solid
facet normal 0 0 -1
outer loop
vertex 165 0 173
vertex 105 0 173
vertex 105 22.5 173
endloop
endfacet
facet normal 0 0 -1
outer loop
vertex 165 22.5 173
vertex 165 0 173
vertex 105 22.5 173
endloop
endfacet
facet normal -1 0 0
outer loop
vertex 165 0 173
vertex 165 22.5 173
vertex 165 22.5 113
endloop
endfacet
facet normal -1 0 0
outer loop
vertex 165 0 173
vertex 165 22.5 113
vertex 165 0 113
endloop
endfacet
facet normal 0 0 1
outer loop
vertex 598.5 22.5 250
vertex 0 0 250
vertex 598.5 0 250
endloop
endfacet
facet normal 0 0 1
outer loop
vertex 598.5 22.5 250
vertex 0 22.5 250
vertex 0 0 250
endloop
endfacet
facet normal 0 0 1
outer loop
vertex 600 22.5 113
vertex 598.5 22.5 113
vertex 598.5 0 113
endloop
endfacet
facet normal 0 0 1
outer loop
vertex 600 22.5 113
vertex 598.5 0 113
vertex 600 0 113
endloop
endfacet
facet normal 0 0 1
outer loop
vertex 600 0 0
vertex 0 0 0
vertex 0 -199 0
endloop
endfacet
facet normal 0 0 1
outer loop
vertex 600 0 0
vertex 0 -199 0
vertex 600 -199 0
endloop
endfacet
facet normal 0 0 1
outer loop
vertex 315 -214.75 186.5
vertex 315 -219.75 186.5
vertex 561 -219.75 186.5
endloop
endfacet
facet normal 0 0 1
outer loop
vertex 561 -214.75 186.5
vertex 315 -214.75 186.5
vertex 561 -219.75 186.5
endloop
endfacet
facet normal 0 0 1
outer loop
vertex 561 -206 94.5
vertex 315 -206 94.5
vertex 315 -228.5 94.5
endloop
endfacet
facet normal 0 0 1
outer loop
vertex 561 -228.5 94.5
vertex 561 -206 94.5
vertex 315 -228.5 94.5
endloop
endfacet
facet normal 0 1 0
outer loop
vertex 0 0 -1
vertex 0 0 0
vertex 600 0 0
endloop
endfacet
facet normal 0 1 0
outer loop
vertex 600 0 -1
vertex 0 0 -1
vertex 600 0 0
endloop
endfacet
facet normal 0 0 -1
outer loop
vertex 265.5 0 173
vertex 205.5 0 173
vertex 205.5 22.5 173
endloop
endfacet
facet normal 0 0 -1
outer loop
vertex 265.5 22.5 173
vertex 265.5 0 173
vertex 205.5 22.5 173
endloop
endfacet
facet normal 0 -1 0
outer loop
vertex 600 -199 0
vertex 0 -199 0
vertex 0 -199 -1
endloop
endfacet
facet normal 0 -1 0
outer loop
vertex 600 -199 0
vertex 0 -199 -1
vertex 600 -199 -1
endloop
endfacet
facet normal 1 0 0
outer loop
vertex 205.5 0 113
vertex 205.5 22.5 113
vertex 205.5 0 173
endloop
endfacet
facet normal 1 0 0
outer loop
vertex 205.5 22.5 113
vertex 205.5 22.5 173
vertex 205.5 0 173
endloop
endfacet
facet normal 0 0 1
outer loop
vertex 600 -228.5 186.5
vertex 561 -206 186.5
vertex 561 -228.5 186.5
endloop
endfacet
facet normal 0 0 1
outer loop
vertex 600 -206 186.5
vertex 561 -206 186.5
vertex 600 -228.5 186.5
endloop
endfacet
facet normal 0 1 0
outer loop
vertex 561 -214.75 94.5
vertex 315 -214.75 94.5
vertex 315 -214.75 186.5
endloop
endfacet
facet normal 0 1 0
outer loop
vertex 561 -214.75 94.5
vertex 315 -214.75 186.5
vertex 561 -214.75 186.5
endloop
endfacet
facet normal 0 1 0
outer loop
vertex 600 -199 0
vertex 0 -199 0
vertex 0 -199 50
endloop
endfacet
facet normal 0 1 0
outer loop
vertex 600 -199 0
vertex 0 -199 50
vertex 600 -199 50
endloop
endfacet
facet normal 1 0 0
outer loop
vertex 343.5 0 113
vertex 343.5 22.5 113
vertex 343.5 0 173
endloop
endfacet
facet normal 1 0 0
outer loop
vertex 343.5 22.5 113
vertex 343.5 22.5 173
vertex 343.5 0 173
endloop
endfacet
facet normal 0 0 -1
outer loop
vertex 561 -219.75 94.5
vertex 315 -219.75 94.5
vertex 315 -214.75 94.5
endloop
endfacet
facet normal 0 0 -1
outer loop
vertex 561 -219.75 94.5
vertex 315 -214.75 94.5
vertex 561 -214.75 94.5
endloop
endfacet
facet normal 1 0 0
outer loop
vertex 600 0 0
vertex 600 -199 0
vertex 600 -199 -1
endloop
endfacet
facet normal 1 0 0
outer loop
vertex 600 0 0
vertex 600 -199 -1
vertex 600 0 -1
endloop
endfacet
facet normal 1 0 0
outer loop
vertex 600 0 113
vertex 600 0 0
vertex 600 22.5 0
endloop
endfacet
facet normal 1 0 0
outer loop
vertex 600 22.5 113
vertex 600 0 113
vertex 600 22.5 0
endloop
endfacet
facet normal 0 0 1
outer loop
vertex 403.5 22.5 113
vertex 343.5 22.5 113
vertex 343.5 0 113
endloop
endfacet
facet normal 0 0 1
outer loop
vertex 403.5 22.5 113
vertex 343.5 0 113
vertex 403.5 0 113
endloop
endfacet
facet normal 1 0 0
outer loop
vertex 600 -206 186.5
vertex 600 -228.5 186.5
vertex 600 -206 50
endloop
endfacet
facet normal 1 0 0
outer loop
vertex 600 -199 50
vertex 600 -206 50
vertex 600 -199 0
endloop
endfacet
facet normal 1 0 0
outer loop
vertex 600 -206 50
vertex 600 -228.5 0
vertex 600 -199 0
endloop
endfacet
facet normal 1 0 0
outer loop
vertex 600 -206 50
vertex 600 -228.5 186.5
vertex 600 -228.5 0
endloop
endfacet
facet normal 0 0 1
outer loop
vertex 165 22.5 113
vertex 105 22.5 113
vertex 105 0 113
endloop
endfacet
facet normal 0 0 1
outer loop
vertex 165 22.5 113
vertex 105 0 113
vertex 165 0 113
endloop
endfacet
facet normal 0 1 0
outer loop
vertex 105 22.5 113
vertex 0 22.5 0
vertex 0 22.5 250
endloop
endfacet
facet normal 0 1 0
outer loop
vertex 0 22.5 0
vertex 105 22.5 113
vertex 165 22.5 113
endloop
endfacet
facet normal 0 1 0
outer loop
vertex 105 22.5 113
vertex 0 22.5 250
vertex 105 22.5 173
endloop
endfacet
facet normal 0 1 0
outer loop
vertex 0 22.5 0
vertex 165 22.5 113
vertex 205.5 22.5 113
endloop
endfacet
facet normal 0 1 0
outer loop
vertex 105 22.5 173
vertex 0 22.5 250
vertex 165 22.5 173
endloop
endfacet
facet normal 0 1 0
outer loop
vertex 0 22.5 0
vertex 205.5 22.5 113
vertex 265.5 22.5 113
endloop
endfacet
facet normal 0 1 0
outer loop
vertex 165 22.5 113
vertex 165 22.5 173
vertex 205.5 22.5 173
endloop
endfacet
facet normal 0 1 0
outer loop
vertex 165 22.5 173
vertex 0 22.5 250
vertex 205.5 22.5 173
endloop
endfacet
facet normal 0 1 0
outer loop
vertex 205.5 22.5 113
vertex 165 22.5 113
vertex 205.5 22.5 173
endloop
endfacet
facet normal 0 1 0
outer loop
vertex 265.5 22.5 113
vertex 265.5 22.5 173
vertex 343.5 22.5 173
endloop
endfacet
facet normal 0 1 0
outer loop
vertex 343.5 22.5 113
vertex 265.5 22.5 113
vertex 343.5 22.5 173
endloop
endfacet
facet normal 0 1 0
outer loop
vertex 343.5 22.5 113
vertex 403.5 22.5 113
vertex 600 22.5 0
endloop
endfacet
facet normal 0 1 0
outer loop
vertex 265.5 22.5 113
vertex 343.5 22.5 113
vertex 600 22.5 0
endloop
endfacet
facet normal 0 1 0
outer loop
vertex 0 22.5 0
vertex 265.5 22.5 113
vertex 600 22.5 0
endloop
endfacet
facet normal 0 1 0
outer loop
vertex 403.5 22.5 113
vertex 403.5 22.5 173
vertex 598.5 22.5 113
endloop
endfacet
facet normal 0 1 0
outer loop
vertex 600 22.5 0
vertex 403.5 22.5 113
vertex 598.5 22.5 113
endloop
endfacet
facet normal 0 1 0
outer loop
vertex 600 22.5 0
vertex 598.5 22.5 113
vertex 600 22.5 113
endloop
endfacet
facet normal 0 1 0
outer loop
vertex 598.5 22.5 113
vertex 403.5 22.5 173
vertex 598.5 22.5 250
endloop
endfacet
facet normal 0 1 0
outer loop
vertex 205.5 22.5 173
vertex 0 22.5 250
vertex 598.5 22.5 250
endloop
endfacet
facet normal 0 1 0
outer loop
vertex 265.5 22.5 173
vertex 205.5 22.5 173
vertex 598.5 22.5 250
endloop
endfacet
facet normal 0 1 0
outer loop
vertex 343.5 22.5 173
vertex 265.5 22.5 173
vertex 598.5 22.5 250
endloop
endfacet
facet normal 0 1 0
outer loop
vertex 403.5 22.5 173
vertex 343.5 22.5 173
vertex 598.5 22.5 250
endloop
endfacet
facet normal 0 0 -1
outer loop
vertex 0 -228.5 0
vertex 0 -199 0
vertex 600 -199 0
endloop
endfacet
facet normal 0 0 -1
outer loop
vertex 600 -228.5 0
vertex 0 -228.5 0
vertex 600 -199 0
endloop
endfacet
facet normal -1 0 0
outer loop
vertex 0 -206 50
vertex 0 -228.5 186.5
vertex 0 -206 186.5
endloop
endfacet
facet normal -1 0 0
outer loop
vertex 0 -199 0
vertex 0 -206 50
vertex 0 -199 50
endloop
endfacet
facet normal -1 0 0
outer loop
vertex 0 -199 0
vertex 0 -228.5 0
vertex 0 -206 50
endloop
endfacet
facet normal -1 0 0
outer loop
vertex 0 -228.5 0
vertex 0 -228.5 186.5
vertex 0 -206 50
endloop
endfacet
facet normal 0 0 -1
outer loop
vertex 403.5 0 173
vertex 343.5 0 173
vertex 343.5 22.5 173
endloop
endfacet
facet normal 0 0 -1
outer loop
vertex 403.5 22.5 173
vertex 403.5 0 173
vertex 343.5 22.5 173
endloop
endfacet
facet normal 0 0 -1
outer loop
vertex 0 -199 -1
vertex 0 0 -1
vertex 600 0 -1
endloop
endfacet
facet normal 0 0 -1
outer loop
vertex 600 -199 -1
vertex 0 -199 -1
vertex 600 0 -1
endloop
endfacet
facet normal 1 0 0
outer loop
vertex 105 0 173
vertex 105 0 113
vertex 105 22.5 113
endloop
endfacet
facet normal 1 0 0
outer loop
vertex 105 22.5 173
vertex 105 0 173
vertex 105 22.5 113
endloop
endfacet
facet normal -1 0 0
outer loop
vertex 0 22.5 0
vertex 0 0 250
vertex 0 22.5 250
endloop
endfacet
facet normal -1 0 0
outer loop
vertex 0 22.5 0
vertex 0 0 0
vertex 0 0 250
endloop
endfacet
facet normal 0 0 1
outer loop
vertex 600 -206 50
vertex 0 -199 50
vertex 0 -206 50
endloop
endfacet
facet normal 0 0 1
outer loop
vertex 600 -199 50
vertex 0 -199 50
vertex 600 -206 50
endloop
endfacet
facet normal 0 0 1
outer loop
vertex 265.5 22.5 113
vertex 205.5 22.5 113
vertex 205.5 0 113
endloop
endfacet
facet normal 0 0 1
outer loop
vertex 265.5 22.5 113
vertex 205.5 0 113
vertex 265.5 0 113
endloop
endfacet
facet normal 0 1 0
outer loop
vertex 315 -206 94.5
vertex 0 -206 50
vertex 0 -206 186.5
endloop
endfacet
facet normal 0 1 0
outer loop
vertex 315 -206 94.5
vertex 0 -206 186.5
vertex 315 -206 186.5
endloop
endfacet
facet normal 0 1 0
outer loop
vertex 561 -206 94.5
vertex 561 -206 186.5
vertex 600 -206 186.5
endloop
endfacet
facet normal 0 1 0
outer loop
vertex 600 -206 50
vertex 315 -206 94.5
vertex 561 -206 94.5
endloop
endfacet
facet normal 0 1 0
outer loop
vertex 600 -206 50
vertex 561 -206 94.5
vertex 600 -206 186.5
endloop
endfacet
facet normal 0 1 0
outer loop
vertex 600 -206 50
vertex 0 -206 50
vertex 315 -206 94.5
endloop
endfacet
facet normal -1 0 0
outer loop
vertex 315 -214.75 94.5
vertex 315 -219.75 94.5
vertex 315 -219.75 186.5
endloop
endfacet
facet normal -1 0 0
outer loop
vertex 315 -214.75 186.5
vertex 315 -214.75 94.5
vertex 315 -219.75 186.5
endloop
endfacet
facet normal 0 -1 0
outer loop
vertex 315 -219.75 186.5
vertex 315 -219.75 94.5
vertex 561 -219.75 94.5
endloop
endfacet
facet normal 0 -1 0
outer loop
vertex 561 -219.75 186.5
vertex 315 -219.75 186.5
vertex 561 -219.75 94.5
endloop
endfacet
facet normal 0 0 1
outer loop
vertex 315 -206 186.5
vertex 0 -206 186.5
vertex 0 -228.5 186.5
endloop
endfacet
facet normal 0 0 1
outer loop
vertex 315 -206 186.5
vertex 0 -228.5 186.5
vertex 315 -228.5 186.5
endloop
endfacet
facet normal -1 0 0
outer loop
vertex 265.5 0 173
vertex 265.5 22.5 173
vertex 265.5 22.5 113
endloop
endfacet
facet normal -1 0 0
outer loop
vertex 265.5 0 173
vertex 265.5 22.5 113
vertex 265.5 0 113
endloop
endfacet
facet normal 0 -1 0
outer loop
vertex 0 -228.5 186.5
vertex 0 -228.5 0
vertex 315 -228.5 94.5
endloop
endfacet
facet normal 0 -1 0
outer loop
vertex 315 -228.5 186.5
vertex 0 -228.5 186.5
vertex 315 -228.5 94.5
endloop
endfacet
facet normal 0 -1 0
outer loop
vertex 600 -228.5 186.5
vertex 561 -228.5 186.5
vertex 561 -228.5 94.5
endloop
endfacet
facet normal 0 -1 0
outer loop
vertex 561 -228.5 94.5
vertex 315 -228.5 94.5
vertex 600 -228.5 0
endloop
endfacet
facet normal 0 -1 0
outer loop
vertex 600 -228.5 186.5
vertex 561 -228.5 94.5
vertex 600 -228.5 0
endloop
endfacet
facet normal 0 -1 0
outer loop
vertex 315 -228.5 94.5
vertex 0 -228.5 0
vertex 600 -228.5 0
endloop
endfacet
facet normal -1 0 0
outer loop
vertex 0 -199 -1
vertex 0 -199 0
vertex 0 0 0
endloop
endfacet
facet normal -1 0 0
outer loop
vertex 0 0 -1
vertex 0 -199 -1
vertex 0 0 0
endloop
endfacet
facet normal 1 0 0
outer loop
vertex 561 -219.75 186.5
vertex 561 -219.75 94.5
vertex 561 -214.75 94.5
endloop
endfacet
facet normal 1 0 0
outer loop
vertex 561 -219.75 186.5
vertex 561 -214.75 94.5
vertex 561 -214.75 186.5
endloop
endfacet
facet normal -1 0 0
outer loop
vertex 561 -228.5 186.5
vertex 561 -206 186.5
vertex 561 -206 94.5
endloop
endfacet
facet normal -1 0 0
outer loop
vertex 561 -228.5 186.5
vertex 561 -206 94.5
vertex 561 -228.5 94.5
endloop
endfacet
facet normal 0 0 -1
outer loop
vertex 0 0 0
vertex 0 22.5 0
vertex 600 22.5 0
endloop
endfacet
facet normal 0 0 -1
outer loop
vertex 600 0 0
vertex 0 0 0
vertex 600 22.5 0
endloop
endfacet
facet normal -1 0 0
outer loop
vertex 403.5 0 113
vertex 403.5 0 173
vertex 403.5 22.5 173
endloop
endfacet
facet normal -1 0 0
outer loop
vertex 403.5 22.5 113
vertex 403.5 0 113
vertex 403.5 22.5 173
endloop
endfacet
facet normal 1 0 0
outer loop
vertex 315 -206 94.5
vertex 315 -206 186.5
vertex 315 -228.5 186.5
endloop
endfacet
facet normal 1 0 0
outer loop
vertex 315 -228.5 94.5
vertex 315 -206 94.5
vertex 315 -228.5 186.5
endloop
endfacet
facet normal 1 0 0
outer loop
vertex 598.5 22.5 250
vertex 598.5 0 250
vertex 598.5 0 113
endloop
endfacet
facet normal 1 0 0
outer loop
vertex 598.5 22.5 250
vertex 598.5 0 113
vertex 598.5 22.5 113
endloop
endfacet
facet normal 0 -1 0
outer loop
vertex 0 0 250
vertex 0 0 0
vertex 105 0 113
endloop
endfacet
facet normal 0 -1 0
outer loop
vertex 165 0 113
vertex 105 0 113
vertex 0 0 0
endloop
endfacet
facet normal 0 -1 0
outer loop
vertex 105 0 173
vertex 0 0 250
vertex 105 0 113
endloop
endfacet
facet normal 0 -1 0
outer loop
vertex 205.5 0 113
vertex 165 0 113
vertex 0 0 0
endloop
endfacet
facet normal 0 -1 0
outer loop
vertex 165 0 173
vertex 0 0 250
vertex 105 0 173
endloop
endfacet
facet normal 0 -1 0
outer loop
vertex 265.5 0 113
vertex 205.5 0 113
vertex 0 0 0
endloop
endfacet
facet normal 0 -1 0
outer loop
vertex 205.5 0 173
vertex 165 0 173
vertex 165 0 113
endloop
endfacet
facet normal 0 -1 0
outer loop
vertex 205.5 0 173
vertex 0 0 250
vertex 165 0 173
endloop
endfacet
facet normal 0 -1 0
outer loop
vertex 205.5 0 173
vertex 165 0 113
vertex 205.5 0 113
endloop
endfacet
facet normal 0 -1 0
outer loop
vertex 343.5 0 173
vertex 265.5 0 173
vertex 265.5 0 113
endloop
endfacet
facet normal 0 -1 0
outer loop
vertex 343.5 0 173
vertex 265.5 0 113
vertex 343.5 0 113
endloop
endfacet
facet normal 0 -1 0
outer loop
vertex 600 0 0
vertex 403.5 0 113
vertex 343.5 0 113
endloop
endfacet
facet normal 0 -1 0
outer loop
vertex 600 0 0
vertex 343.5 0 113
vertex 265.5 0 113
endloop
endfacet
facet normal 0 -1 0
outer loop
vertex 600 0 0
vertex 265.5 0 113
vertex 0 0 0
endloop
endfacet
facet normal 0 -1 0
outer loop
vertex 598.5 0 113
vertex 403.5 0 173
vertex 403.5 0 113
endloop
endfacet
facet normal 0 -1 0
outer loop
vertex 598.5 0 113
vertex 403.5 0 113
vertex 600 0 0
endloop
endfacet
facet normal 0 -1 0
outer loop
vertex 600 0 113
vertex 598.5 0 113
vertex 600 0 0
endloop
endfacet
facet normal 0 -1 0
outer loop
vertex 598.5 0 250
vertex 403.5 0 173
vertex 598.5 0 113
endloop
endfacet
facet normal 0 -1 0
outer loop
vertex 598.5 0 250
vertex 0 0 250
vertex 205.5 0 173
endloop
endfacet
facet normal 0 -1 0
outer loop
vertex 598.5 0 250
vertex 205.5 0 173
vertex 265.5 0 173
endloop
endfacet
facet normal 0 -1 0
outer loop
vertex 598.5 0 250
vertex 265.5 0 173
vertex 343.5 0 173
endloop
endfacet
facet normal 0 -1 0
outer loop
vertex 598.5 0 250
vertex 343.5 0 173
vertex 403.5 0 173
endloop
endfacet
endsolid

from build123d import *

# Parameters (mm, degrees)
F1_W      = 600
F1_H      = 22.5
F2_DEPTH  = 113
F3_W      = 105
F3_H      = 22.5
F4_DEPTH  = 137
F5_W      = 22.5
F5_H      = 77
F6_DEPTH  = 100.5
F7_W      = 40.5
F7_H      = 22.5
F8_DEPTH  = 61
F9_W      = 22.5
F9_H      = 77
F10_DEPTH = 138
F11_W     = 78
F11_H     = 22.5
F12_DEPTH = 61
F13_W     = 22.5
F13_H     = 77
F14_DEPTH = 60
F15_W     = 195
F15_H     = 22.5
F16_DEPTH = 140
F0_W      = 600
F0_H      = 199
F17_DEPTH = 1
F18_W     = 600
F18_H     = 29.5
F19_DEPTH = 50
F20_W     = 600
F20_H     = 22.5
F21_DEPTH = 136.5
F23_START = -315
F22_W     = 22.5
F22_H     = 92
F23_DEPTH = 246
F24_W     = 246
F24_H     = 5
F25_DEPTH = 92
F26_DEPTH = 8.75
F27_DEPTH = 8.75


with BuildPart() as f2:
    # F1 (on face) → F2 (new body)
    with BuildSketch(Plane.XY):
        with Locations((300, 11.25)):
            Rectangle(F1_W, F1_H)
    extrude(amount=F2_DEPTH)

    # F3 (on face) → F4 (join)
    with BuildSketch(Plane.XY.offset(113)):
        with Locations((52.5, 11.25)):
            Rectangle(F3_W, F3_H)
    extrude(amount=F4_DEPTH)

    # F5 (on face) → F6 (join)
    with BuildSketch(Plane.YZ.offset(105)):
        with Locations((11.25, 211.5)):
            Rectangle(F5_W, F5_H)
    extrude(amount=F6_DEPTH)

    # F7 (on face) → F8 (join)
    with BuildSketch(Plane(origin=(0, 0, 173), x_dir=(1, 0, 0), z_dir=(0, 0, -1))):
        with Locations((185.25, -11.25)):
            Rectangle(F7_W, F7_H)
    extrude(amount=F8_DEPTH)

    # F9 (on face) → F10 (join)
    with BuildSketch(Plane.YZ.offset(205.5)):
        with Locations((11.25, 211.5)):
            Rectangle(F9_W, F9_H)
    extrude(amount=F10_DEPTH)

    # F11 (on face) → F12 (join)
    with BuildSketch(Plane(origin=(0, 0, 173), x_dir=(1, 0, 0), z_dir=(0, 0, -1))):
        with Locations((304.5, -11.25)):
            Rectangle(F11_W, F11_H)
    extrude(amount=F12_DEPTH)

    # F13 (on face) → F14 (join)
    with BuildSketch(Plane.YZ.offset(343.5)):
        with Locations((11.25, 211.5)):
            Rectangle(F13_W, F13_H)
    extrude(amount=F14_DEPTH)

    # F15 (on face) → F16 (join)
    with BuildSketch(Plane.XY.offset(250)):
        with Locations((501, 11.25)):
            Rectangle(F15_W, F15_H)
    extrude(amount=-F16_DEPTH)


with BuildPart() as f17:
    # F0 (on Top) → F17 (new body)
    with BuildSketch(Plane.XY):
        with Locations((300, -99.5)):
            Rectangle(F0_W, F0_H)
    extrude(amount=-F17_DEPTH)


with BuildPart() as f19:
    # F18 (on face) → F19 (new body)
    with BuildSketch(Plane.XY):
        with Locations((300, -213.75)):
            Rectangle(F18_W, F18_H)
    extrude(amount=F19_DEPTH)

    # F20 (on face) → F21 (join)
    with BuildSketch(Plane.XY.offset(50)):
        with Locations((300, -217.25)):
            Rectangle(F20_W, F20_H)
    extrude(amount=F21_DEPTH)

    # F22 (on face) → F23 (cut)
    with BuildSketch(Plane(origin=(0, 0, 0), x_dir=(0, -1, 0), z_dir=(-1, 0, 0)).offset(F23_START)):
        with Locations((217.25, 140.5)):
            Rectangle(F22_W, F22_H)
    extrude(amount=-F23_DEPTH, mode=Mode.SUBTRACT)


with BuildPart() as f25:
    # F24 (on face) → F25 (new body)
    with BuildSketch(Plane.XY.offset(94.5)):
        with Locations((438, -226)):
            Rectangle(F24_W, F24_H)
    extrude(amount=F25_DEPTH)

    # F26 (add): a face of the model
    f26_faces = [f25.faces().sort_by_distance(p)[0] for p in [
        (438, -223.5, 140.5),
    ]]
    extrude(f26_faces, amount=F26_DEPTH)

    # F27 (cut): a face of the model
    f27_faces = [f25.faces().sort_by_distance(p)[0] for p in [
        (438, -228.5, 140.5),
    ]]
    extrude(f27_faces, amount=-F27_DEPTH, mode=Mode.SUBTRACT)


solid = Compound([f2.part, f17.part, f19.part, f25.part])
